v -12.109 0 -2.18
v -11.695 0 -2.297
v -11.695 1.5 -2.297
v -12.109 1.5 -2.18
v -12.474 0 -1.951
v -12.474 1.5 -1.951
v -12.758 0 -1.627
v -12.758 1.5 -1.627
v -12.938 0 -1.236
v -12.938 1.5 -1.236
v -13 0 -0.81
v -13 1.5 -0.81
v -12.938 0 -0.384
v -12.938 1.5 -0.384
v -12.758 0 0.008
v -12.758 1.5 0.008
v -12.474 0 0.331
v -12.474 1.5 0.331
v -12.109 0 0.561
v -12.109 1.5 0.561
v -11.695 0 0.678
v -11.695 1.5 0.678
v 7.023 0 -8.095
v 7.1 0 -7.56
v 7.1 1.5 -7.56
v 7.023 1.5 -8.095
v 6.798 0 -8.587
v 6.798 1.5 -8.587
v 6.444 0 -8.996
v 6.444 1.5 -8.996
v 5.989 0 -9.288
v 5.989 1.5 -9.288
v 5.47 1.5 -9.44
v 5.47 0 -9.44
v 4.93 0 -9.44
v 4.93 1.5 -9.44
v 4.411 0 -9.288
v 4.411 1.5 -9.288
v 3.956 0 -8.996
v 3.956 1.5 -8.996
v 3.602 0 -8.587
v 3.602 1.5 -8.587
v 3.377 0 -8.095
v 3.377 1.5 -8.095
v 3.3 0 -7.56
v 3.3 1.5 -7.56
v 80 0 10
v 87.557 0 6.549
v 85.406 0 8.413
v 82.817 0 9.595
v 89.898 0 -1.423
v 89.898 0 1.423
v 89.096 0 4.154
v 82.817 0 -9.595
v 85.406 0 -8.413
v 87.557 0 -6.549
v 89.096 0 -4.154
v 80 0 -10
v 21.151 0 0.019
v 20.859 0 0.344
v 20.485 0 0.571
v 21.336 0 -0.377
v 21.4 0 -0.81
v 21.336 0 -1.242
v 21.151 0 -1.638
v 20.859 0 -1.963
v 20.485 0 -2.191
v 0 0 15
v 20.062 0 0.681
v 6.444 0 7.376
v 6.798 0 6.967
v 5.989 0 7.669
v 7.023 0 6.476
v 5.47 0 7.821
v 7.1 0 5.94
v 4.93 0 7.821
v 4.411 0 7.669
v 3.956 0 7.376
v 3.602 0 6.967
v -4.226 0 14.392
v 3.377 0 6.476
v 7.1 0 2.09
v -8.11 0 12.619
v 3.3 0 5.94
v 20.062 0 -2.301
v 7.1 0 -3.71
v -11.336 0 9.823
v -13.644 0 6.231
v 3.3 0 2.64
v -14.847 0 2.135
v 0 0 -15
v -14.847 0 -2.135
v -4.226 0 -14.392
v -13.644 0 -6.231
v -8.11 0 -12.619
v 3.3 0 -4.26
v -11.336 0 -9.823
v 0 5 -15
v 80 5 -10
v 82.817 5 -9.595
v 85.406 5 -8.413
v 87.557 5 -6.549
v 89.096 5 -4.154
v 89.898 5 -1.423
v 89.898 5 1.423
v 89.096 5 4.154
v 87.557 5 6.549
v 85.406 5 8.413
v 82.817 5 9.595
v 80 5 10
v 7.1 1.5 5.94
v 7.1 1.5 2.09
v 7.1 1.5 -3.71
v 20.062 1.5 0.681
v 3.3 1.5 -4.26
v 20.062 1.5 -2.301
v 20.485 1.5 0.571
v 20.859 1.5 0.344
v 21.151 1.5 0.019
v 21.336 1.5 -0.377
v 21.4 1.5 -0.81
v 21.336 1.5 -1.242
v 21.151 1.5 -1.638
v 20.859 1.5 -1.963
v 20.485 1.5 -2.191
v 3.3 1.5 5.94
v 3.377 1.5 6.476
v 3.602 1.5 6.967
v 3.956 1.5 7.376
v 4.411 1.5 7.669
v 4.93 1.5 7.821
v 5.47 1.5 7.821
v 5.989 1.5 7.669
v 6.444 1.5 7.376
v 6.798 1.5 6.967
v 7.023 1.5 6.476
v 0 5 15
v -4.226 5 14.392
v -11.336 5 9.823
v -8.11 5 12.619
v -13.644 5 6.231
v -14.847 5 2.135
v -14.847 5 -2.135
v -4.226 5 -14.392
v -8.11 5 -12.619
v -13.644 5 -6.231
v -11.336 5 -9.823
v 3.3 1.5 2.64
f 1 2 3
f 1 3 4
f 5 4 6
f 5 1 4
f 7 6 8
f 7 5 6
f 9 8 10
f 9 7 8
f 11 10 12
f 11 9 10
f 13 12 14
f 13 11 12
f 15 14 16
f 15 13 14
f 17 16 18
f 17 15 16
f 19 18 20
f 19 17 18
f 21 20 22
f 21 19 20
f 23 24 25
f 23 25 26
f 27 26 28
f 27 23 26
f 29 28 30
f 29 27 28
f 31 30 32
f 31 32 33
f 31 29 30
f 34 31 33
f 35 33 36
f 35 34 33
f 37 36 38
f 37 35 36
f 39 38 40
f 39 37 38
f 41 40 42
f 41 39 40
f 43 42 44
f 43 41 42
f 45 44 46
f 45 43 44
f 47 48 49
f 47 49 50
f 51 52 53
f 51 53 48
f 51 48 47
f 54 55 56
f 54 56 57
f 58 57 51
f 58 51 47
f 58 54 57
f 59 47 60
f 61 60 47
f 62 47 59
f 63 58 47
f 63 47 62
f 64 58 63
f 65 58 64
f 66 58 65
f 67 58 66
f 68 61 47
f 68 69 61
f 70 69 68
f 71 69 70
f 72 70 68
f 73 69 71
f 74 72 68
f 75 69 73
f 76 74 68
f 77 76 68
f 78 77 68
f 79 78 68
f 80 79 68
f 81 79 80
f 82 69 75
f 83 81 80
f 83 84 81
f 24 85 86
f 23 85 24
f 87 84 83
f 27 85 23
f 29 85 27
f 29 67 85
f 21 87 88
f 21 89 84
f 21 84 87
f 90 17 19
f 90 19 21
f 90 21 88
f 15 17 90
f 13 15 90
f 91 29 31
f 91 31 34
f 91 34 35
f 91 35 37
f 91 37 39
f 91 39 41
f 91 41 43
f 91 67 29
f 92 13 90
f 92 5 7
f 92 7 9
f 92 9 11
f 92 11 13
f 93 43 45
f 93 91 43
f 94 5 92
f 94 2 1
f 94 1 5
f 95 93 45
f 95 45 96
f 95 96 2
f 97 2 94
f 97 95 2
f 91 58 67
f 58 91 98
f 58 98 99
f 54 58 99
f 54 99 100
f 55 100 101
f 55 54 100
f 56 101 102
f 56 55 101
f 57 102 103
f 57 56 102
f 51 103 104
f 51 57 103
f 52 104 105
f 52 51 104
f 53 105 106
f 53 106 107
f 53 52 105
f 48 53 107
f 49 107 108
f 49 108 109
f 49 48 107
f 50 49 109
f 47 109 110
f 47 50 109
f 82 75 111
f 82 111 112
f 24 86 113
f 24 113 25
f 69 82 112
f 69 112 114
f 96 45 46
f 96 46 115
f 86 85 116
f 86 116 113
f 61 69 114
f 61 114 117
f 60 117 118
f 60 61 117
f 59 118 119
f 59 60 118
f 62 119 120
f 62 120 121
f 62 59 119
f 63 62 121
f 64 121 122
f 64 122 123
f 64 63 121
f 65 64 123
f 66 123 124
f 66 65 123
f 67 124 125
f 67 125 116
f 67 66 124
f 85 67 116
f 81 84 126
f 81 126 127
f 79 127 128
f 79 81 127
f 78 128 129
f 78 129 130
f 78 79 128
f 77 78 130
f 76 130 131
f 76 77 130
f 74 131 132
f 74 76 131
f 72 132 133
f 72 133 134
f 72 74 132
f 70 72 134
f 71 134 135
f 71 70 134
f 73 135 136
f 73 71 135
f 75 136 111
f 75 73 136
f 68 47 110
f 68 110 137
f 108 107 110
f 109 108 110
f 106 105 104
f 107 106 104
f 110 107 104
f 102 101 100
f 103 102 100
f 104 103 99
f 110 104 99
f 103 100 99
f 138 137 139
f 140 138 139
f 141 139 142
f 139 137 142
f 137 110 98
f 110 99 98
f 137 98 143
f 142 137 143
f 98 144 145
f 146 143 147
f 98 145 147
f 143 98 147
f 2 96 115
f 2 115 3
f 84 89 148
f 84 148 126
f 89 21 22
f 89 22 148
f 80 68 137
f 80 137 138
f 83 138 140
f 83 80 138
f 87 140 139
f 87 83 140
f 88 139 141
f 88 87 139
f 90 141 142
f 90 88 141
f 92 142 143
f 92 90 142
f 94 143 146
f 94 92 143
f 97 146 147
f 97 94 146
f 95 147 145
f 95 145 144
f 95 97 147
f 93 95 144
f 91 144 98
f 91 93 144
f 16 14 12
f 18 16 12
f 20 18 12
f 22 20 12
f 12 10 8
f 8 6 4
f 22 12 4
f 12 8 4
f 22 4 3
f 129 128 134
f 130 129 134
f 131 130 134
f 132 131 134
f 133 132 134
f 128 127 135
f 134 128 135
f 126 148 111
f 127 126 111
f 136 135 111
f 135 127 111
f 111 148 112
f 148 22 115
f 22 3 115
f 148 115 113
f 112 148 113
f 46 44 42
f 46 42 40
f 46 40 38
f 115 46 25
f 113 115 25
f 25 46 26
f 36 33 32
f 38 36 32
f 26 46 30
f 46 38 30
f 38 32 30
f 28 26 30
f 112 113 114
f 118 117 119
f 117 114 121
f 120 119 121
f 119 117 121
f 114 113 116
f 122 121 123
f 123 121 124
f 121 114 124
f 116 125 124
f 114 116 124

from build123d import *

# Parameters (mm, degrees)
BOSS_EXTRUDE1_DEPTH = 5
CUT_EXTRUDE1_DEPTH  = 1.5


with BuildPart() as part:
    # Sketch1 → Boss-Extrude1 (new body)
    with BuildSketch(Plane(origin=(0, 0, 0), x_dir=(1, 0, 0), z_dir=(0, 1, 0))):
        with BuildLine():
            Line((0, 15), (80, 10))
            ThreePointArc((80, 10), (90, 0), (80, -10))
            Line((80, -10), (0, -15))
            ThreePointArc((0, -15), (-15, 0), (0, 15))
        make_face()
    extrude(amount=BOSS_EXTRUDE1_DEPTH)

    # Sketch1<3> → Cut-Extrude1 (cut)
    with BuildSketch(Plane(origin=(0, 0, 0), x_dir=(1, 0, 0), z_dir=(0, 1, 0))):
        with BuildLine():
            Line((3.3, 7.559743015), (3.3, 4.259743015))
            Line((3.3, 4.259743015), (-11.694677741, 2.297056223))
            ThreePointArc((-11.694677741, 2.297056223), (-13, 0.809743015), (-11.694677741, -0.677570192))
            Line((-11.694677741, -0.677570192), (3.3, -2.640256985))
            Line((3.3, -2.640256985), (3.3, -5.940256985))
            ThreePointArc((3.3, -5.940256985), (5.2, -7.840256985), (7.1, -5.940256985))
            Line((7.1, -5.940256985), (7.1, -2.090256985))
            Line((7.1, -2.090256985), (20.062072923, -0.681475402))
            ThreePointArc((20.062072923, -0.681475402), (21.4, 0.809743015), (20.062072923, 2.300961432))
            Line((20.062072923, 2.300961432), (7.1, 3.709743015))
            Line((7.1, 3.709743015), (7.1, 7.559743015))
            ThreePointArc((7.1, 7.559743015), (5.2, 9.459743015), (3.3, 7.559743015))
        make_face()
    extrude(amount=CUT_EXTRUDE1_DEPTH, mode=Mode.SUBTRACT)


solid = part.part
